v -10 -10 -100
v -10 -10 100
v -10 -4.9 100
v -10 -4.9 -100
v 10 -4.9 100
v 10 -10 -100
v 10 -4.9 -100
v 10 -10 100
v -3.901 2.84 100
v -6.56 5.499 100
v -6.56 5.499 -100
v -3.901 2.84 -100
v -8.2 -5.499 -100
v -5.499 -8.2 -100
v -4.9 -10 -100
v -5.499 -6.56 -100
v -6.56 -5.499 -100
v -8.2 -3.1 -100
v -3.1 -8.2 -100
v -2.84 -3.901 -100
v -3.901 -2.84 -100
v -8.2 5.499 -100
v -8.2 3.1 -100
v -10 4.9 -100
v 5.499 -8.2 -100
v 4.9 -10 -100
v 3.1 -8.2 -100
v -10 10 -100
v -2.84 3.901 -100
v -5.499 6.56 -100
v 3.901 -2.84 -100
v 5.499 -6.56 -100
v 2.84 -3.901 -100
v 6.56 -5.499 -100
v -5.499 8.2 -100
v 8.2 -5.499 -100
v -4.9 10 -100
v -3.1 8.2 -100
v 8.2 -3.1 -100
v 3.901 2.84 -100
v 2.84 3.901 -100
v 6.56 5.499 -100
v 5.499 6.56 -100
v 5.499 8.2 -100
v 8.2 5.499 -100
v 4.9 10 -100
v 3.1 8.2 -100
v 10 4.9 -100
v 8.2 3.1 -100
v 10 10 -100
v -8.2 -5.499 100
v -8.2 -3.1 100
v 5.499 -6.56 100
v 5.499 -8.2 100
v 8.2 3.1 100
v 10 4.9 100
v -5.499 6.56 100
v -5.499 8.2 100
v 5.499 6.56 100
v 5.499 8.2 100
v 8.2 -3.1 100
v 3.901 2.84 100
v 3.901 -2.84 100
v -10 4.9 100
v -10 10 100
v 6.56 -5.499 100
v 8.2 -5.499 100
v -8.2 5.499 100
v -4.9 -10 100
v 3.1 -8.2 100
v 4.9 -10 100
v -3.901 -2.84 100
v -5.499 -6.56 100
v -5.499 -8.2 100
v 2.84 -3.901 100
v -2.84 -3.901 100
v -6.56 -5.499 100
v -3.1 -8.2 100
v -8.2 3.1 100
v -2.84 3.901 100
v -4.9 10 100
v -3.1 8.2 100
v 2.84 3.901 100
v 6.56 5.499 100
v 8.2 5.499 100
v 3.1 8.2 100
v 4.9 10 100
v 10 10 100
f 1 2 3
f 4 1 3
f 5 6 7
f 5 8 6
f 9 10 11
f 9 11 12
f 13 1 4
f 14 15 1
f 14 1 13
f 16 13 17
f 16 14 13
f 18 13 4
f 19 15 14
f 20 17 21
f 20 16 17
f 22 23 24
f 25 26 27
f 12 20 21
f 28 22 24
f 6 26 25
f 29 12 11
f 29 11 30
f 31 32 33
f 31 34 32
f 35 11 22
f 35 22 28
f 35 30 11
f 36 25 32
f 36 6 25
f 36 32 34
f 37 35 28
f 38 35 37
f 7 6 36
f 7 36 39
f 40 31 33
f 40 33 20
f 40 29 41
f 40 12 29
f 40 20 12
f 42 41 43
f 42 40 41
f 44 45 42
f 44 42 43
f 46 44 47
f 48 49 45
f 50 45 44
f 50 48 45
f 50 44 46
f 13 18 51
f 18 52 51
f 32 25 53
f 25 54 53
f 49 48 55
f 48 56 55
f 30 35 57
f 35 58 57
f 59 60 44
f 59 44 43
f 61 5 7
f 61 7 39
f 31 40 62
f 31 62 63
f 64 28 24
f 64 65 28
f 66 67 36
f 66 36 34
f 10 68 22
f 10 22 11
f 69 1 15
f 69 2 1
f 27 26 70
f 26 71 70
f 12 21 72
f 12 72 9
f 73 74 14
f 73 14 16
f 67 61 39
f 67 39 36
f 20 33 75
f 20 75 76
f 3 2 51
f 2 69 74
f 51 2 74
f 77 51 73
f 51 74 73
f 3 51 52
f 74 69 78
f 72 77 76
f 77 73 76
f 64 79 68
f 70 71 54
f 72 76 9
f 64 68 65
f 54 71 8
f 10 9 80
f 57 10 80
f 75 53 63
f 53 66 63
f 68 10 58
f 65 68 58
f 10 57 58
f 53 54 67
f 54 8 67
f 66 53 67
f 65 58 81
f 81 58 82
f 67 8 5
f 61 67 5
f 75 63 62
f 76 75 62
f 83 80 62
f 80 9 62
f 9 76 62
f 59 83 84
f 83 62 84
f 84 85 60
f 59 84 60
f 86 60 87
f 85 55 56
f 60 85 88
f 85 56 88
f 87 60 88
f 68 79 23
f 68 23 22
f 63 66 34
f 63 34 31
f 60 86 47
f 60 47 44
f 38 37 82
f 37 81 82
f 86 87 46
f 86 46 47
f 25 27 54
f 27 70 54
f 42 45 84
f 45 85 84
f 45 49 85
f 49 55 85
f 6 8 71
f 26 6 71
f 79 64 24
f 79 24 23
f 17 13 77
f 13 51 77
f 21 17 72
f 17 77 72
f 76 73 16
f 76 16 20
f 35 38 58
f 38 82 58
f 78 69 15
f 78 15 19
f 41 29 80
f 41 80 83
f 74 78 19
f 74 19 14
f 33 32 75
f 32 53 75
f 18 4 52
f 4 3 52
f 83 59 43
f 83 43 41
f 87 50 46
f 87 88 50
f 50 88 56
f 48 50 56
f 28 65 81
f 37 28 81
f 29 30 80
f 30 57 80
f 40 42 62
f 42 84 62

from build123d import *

# Parameters (mm, degrees)
PAD_DEPTH            = 100
PAD_MIRRORED_2_DEPTH = 100
POLARPATTERN_COUNT   = 4


with BuildPart() as part:
    # Sketch → Pad (new body, symmetric)
    with BuildSketch(Plane.XY):
        Polygon((10, 10), (4.9, 10), (3.1, 8.2), (5.49934, 8.2), (5.49934, 6.56), (2.84, 3.90066), (0, 3.90066), (0, 0), align=None)
    pad = extrude(amount=PAD_DEPTH, both=True)

    # Sketch Mirrored 2 → Pad Mirrored 2 (add, symmetric)
    with BuildSketch(Plane(origin=(0, 0, 0), x_dir=(-1, 0, 0), z_dir=(0, 0, -1))):
        Polygon((10, 10), (4.9, 10), (3.1, 8.2), (5.49934, 8.2), (5.49934, 6.56), (2.84, 3.90066), (0, 3.90066), (0, 0), align=None)
    pad_mirrored_2 = extrude(amount=-PAD_MIRRORED_2_DEPTH, both=True)

    # PolarPattern: Pad, Pad Mirrored 2 ×4 about axis
    polarpattern_axis = Axis((0, 0, 0), (0, 0, 1))
    for i in range(1, POLARPATTERN_COUNT):
        add(pad.rotate(polarpattern_axis, i * 360 / POLARPATTERN_COUNT))
        add(pad_mirrored_2.rotate(polarpattern_axis, i * 360 / POLARPATTERN_COUNT))


solid = part.part
